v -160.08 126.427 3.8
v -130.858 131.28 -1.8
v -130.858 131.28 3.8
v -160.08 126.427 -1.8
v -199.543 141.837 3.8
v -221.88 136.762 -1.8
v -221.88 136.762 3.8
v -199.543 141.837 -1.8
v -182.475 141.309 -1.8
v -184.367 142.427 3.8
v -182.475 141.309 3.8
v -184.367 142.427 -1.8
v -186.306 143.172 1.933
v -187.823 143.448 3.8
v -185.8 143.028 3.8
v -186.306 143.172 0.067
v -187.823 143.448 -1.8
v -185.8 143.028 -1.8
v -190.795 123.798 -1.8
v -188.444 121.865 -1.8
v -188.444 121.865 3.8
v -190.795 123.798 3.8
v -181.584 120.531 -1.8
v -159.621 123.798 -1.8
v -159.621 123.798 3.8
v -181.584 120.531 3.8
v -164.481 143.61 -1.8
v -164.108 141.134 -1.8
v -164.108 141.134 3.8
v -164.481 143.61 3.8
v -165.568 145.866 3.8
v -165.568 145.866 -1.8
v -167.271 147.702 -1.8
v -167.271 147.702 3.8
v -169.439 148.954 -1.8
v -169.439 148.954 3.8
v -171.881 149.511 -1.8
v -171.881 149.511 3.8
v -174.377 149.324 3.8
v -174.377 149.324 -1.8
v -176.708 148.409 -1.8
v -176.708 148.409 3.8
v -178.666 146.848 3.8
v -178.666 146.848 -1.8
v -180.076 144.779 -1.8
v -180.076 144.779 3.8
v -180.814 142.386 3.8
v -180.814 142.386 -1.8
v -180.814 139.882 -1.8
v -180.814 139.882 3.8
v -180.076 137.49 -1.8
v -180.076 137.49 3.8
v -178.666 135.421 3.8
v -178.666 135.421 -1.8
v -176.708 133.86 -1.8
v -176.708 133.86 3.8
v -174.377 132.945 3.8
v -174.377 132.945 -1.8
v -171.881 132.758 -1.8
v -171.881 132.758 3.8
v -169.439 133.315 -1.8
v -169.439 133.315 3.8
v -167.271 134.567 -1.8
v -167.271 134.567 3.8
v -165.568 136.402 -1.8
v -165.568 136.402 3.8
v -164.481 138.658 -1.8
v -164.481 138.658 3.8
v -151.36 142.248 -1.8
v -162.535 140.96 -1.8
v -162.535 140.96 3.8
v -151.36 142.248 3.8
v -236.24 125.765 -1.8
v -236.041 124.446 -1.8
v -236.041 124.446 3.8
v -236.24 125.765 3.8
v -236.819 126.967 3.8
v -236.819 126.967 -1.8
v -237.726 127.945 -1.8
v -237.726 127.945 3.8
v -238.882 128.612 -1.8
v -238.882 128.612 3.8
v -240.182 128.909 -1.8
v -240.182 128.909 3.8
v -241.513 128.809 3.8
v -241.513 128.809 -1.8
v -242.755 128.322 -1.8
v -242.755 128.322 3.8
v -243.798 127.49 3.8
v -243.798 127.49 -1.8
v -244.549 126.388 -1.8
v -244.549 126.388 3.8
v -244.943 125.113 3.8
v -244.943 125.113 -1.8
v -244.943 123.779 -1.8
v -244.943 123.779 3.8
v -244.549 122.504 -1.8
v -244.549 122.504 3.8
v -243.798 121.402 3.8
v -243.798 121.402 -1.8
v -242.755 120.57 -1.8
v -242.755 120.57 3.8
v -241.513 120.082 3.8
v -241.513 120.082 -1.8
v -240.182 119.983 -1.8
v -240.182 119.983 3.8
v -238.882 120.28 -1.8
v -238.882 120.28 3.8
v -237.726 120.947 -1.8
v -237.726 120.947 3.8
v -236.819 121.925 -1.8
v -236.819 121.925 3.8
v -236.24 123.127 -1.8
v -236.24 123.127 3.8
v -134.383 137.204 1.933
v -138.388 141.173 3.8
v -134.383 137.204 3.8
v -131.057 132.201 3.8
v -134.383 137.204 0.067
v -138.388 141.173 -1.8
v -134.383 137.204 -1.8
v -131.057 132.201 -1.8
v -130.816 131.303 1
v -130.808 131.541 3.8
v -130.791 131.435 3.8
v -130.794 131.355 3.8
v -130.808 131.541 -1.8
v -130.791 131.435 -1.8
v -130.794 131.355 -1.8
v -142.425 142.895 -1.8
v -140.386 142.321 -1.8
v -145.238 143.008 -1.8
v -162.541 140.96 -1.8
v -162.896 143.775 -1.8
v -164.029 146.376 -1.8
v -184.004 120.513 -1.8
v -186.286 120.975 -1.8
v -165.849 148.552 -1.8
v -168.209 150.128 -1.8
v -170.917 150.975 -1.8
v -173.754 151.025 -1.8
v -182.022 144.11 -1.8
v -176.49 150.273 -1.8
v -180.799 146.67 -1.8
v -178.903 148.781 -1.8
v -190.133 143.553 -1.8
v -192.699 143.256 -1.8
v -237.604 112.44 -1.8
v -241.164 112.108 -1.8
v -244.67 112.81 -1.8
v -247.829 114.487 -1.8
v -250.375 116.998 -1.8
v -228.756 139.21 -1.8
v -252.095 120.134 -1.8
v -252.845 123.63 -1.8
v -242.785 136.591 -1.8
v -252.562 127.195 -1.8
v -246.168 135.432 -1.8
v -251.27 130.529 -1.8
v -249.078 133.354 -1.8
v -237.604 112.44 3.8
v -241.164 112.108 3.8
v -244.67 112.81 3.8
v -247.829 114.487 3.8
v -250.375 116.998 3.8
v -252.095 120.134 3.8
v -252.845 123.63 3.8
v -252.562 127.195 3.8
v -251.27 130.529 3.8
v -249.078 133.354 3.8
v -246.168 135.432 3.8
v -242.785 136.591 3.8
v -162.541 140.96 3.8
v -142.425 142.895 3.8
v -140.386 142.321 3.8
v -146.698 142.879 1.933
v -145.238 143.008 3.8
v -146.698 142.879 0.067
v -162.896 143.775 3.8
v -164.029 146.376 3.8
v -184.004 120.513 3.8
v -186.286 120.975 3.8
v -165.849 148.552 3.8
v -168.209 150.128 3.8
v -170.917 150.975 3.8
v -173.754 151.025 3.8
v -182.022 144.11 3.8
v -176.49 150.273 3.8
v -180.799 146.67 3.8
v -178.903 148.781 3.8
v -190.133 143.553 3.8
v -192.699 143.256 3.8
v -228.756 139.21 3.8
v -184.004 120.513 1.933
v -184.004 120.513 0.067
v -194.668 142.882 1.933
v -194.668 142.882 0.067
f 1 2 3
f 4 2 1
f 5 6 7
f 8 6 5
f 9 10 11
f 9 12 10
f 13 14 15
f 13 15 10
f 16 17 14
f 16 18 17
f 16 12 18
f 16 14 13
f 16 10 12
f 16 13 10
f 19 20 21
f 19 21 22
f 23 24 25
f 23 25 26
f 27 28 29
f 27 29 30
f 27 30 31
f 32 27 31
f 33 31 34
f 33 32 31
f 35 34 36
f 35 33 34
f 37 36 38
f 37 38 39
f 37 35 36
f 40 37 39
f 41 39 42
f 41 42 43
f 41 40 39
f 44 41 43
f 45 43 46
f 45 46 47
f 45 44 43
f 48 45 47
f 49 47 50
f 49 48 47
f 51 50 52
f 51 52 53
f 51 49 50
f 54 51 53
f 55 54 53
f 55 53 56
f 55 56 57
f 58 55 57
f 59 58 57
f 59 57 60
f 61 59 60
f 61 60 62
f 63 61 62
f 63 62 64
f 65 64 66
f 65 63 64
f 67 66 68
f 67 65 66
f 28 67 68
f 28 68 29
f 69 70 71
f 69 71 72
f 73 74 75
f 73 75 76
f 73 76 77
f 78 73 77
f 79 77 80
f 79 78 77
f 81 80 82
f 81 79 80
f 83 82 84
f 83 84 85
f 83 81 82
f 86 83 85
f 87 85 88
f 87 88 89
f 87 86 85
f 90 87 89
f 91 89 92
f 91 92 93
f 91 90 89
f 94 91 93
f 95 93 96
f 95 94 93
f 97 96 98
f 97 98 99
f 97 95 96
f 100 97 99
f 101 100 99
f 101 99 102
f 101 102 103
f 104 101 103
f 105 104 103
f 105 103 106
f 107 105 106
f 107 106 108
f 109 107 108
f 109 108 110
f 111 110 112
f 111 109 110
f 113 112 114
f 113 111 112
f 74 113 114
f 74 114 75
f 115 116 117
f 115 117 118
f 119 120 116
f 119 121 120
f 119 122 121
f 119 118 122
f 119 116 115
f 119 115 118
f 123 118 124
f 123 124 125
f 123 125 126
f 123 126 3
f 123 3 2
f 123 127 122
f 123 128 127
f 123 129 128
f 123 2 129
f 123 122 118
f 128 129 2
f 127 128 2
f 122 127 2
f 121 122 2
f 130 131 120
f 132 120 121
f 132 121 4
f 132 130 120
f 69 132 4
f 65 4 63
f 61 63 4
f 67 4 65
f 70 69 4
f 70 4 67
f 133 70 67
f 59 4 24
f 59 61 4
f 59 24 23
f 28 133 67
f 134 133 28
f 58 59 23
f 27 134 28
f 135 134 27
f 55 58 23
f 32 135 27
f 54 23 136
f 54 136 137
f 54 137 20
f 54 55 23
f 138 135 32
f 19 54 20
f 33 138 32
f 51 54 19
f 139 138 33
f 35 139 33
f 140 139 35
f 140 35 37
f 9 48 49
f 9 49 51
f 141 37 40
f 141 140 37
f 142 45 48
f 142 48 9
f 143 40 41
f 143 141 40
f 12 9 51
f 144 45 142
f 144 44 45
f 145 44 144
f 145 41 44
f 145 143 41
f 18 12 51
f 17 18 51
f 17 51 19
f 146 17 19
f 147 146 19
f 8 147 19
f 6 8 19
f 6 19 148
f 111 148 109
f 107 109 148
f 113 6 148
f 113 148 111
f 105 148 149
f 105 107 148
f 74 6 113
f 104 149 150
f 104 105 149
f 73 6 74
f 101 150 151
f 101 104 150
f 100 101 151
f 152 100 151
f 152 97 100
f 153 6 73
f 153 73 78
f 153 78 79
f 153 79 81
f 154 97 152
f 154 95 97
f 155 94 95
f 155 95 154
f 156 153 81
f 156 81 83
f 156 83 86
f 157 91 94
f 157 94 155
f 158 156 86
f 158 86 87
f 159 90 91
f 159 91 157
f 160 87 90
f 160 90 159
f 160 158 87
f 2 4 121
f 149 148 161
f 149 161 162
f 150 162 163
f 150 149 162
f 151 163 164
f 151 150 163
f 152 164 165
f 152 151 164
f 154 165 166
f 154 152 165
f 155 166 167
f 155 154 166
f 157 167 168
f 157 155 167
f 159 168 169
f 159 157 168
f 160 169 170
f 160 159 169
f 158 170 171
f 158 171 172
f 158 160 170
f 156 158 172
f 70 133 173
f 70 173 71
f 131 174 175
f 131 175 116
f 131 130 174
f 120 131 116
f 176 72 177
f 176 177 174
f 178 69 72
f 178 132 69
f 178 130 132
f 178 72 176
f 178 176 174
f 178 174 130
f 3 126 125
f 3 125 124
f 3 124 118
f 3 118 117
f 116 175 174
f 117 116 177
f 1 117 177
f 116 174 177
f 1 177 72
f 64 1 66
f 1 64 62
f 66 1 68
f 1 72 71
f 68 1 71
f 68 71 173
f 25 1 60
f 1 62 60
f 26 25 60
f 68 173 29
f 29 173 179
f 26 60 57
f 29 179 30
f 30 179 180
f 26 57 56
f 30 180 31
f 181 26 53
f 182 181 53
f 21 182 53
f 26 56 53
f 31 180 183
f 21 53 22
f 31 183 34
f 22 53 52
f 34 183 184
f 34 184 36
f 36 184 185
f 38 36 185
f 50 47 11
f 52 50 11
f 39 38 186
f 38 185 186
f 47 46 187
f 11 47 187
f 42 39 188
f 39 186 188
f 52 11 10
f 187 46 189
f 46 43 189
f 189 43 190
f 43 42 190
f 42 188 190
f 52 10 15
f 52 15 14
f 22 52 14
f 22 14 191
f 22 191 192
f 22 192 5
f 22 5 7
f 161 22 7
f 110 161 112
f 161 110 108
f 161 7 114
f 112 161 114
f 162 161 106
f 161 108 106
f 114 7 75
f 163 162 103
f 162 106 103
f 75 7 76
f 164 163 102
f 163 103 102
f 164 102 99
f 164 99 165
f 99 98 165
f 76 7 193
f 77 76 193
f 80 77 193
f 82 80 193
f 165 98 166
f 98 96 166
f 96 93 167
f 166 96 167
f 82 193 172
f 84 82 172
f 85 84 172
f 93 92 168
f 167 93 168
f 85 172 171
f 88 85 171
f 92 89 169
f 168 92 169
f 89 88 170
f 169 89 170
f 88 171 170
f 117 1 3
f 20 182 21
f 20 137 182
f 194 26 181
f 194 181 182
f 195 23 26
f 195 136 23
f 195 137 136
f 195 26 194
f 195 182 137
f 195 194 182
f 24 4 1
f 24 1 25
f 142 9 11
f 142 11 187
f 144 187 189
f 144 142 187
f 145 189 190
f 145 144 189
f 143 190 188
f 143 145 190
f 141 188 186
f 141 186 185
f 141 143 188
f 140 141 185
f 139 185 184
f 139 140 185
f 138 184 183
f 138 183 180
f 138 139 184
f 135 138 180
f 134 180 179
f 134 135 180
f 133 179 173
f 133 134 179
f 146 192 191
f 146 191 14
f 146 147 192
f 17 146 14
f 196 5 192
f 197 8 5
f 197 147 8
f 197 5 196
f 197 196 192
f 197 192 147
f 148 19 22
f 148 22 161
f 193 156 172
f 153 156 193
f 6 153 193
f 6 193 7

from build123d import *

# Parameters (mm, degrees)
SKETCH1_R           = 1.598426077
SKETCH1_R_2         = 3
BOSS_EXTRUDE1_DEPTH = 2
SCALE1_SCALE        = 2.8


with BuildPart() as part:
    # Sketch1 → Boss-Extrude1 (new body)
    with BuildSketch(Plane.XY):
        with BuildLine():
            Line((-185.215931952, 133.947260869), (-185.213664396, 133.947234502))
            Line((-185.213664396, 133.947234502), (-181.222608058, 134.40739012))
            add(Edge.make_bspline(
                [(-181.222608058, 134.40739012), (-179.470077492, 134.609439885), (-178.007424926, 135.082040692), (-176.58956977, 134.02354039)],
                knots=[0.1, 0.1, 0.1, 0.1, 0.133333333, 0.133333333, 0.133333333, 0.133333333], degree=3))
            add(Edge.make_bspline(
                [(-176.58956977, 134.02354039), (-175.053406211, 132.876684515), (-173.674389539, 130.527654949), (-173.900512309, 130.490108445)],
                knots=[0.133333333, 0.133333333, 0.133333333, 0.133333333, 0.166666667, 0.166666667, 0.166666667, 0.166666667], degree=3))
            Line((-173.900512309, 130.490108445), (-184.336884958, 128.757089405))
            Line((-184.336884958, 128.757089405), (-184.173119971, 127.817925817))
            Line((-184.173119971, 127.817925817), (-192.016779912, 126.651189278))
            add(Edge.make_bspline(
                [(-192.016779912, 126.651189278), (-192.907955692, 126.552708804), (-193.71626022, 126.739571219), (-194.466926644, 127.127560556)],
                knots=[0.266666667, 0.266666667, 0.266666667, 0.266666667, 0.3, 0.3, 0.3, 0.3], degree=3))
            Line((-194.466926644, 127.127560556), (-195.306587773, 127.817925817))
            Line((-195.306587773, 127.817925817), (-212.023872072, 123.761509934))
            ThreePointArc((-212.023872072, 123.761509934), (-217.37856884, 127.123951805), (-213.87424985, 132.386892164))
            Line((-213.87424985, 132.386892164), (-208.863883058, 133.322461629))
            Line((-208.863883058, 133.322461629), (-206.408455346, 132.448142845))
            Line((-206.408455346, 132.448142845), (-198.430956882, 134.26057907))
            add(Edge.make_bspline(
                [(-198.430956882, 134.26057907), (-196.41657636, 134.684664731), (-195.322164303, 134.996216346), (-194.244996216, 134.835931794)],
                knots=[0.833333333, 0.833333333, 0.833333333, 0.833333333, 0.866666667, 0.866666667, 0.866666667, 0.866666667], degree=3))
            add(Edge.make_bspline(
                [(-194.244996216, 134.835931794), (-193.666057591, 134.749817409), (-193.283526207, 134.691889269), (-192.335160561, 134.072002805)],
                knots=[0.866666667, 0.866666667, 0.866666667, 0.866666667, 0.9, 0.9, 0.9, 0.9], degree=3))
            ThreePointArc((-192.335160561, 134.072002805), (-188.713175288, 137.569246142), (-185.215931952, 133.947260869))
        make_face()
        with Locations((-213.064337356, 128.049471145)):
            Circle(SKETCH1_R, mode=Mode.SUBTRACT)
        with Locations((-188.775546256, 134.009631837)):
            Circle(SKETCH1_R_2, mode=Mode.SUBTRACT)
    extrude(amount=BOSS_EXTRUDE1_DEPTH)


with BuildPart() as part_1:
    # Scale1: scaled about (-197.812909455, 130.051467898, 1)
    add(part.part.scale(SCALE1_SCALE).moved(Location((356.063237019, -234.092642216, -1.8))))


solid = part_1.part
